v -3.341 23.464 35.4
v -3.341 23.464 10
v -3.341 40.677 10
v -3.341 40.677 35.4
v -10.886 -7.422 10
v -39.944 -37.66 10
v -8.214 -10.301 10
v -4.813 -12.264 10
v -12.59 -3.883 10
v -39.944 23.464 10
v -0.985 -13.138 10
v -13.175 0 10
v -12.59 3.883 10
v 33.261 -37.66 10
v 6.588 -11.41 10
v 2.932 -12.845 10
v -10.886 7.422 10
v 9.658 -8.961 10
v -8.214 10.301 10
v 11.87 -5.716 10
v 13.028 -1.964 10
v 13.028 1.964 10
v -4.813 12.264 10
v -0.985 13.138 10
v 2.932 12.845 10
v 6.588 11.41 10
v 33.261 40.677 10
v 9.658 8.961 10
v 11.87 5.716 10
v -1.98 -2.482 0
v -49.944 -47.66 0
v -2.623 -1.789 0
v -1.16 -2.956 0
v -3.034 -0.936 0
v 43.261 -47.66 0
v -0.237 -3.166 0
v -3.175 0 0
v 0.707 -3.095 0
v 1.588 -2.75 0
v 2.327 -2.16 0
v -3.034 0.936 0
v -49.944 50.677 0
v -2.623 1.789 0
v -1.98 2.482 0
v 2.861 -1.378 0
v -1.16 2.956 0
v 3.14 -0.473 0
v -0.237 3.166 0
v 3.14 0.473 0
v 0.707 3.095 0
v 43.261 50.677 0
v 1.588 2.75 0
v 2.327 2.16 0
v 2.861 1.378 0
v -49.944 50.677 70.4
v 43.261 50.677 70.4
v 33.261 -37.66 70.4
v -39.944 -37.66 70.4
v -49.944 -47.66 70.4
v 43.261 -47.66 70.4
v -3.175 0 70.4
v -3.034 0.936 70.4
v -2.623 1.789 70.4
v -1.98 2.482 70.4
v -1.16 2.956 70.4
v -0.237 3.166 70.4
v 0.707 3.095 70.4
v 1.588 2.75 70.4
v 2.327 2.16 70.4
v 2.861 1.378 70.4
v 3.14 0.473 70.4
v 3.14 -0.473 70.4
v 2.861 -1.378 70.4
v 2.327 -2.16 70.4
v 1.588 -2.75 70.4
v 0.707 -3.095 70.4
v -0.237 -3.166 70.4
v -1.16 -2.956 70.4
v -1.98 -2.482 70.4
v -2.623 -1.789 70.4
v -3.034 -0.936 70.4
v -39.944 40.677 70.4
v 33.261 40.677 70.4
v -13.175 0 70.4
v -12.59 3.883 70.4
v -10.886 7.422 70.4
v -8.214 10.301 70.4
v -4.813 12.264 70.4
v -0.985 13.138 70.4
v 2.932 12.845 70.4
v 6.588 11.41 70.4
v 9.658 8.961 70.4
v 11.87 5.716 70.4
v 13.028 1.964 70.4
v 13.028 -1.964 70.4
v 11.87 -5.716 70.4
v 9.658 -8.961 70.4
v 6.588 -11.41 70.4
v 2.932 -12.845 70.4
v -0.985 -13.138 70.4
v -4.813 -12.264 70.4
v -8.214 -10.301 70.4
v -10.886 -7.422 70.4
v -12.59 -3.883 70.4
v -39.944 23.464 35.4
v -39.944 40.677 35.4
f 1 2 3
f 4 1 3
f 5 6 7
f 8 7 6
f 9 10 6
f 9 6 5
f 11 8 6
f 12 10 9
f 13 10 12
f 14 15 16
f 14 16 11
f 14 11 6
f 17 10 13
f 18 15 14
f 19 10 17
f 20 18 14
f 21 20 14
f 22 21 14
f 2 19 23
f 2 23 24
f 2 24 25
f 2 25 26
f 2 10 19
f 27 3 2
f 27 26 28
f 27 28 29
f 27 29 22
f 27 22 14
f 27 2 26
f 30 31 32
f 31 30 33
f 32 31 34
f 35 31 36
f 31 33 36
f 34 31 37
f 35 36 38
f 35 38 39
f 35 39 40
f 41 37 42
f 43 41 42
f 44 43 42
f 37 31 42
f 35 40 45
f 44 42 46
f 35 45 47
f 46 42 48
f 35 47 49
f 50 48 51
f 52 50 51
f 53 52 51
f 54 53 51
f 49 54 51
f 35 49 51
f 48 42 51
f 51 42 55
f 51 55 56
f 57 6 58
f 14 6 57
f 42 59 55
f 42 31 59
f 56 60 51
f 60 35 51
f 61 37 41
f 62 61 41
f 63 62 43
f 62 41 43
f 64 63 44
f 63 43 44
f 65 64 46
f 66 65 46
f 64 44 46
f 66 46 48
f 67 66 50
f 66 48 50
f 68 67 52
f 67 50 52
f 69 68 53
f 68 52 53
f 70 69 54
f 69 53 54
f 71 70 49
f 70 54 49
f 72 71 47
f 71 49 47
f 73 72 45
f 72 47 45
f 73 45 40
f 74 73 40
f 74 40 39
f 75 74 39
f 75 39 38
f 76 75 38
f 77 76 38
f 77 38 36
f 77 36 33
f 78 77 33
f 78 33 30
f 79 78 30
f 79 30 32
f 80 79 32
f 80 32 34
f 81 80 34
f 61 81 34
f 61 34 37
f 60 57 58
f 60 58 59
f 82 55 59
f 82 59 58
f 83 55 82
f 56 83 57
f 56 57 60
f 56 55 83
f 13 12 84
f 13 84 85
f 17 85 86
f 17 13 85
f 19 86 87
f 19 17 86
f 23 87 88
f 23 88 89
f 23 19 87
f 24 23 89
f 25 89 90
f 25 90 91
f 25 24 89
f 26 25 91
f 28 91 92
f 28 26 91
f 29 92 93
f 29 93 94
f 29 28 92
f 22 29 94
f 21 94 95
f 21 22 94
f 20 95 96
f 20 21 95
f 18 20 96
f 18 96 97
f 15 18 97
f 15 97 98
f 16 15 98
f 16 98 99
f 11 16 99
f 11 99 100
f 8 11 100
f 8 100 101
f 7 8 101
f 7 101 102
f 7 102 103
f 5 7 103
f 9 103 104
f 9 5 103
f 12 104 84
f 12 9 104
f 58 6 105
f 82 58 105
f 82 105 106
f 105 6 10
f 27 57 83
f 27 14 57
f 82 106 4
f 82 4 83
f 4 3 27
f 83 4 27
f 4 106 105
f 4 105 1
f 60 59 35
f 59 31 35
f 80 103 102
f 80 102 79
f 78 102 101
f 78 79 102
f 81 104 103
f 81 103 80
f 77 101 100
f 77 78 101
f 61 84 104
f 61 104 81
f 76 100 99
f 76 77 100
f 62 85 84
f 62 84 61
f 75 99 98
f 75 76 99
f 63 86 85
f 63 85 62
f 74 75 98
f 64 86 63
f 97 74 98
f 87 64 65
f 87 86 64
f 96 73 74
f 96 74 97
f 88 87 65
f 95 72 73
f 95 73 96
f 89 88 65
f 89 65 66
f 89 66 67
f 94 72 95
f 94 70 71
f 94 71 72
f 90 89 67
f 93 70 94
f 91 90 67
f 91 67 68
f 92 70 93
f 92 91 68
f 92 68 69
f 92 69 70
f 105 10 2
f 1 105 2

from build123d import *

# Parameters (mm, degrees)
F0_W     = 93.204498291
F0_H     = 98.337136209
F1_DEPTH = 25.4
F2_DEPTH = 45
F4_D     = 6.35
F7_T     = -10
F8_W     = 36.6022491455
F8_H     = 17.213357389
F9_DEPTH = 25.4


# Not quite as in the source:
# - the program builds the solid bodies; features that only make, move or delete a surface that nothing else refers to are left out


with BuildPart() as f1:
    # F0 (on Top) → F1 (new body)
    with BuildSketch(Plane.XY):
        with Locations((-3.3413916826, 1.5083067119)):
            Rectangle(F0_W, F0_H)
    extrude(amount=F1_DEPTH)

    # F2 (add): a face of the model
    f2_faces = [f1.faces().sort_by_distance(p)[0] for p in [
        (-3.3413916826, 1.5083067119, 25.4),
    ]]
    extrude(f2_faces, amount=F2_DEPTH)

    # F4 (through all)
    with Locations(Plane.XY.offset(70.4)):
        with Locations((0, 0)):
            Hole(F4_D / 2)

    # F7
    f7_openings = [f1.faces().sort_by_distance(p)[0] for p in [
        (-3.352977, 1.513536, 70.4),
    ]]
    offset(amount=F7_T, openings=f7_openings)

    # F8 (on face) → F9 (join)
    with BuildSketch(Plane.XY.offset(10)):
        with Locations((-21.6425162554, 32.0701961219)):
            Rectangle(F8_W, F8_H)
    extrude(amount=F9_DEPTH)


solid = f1.part
